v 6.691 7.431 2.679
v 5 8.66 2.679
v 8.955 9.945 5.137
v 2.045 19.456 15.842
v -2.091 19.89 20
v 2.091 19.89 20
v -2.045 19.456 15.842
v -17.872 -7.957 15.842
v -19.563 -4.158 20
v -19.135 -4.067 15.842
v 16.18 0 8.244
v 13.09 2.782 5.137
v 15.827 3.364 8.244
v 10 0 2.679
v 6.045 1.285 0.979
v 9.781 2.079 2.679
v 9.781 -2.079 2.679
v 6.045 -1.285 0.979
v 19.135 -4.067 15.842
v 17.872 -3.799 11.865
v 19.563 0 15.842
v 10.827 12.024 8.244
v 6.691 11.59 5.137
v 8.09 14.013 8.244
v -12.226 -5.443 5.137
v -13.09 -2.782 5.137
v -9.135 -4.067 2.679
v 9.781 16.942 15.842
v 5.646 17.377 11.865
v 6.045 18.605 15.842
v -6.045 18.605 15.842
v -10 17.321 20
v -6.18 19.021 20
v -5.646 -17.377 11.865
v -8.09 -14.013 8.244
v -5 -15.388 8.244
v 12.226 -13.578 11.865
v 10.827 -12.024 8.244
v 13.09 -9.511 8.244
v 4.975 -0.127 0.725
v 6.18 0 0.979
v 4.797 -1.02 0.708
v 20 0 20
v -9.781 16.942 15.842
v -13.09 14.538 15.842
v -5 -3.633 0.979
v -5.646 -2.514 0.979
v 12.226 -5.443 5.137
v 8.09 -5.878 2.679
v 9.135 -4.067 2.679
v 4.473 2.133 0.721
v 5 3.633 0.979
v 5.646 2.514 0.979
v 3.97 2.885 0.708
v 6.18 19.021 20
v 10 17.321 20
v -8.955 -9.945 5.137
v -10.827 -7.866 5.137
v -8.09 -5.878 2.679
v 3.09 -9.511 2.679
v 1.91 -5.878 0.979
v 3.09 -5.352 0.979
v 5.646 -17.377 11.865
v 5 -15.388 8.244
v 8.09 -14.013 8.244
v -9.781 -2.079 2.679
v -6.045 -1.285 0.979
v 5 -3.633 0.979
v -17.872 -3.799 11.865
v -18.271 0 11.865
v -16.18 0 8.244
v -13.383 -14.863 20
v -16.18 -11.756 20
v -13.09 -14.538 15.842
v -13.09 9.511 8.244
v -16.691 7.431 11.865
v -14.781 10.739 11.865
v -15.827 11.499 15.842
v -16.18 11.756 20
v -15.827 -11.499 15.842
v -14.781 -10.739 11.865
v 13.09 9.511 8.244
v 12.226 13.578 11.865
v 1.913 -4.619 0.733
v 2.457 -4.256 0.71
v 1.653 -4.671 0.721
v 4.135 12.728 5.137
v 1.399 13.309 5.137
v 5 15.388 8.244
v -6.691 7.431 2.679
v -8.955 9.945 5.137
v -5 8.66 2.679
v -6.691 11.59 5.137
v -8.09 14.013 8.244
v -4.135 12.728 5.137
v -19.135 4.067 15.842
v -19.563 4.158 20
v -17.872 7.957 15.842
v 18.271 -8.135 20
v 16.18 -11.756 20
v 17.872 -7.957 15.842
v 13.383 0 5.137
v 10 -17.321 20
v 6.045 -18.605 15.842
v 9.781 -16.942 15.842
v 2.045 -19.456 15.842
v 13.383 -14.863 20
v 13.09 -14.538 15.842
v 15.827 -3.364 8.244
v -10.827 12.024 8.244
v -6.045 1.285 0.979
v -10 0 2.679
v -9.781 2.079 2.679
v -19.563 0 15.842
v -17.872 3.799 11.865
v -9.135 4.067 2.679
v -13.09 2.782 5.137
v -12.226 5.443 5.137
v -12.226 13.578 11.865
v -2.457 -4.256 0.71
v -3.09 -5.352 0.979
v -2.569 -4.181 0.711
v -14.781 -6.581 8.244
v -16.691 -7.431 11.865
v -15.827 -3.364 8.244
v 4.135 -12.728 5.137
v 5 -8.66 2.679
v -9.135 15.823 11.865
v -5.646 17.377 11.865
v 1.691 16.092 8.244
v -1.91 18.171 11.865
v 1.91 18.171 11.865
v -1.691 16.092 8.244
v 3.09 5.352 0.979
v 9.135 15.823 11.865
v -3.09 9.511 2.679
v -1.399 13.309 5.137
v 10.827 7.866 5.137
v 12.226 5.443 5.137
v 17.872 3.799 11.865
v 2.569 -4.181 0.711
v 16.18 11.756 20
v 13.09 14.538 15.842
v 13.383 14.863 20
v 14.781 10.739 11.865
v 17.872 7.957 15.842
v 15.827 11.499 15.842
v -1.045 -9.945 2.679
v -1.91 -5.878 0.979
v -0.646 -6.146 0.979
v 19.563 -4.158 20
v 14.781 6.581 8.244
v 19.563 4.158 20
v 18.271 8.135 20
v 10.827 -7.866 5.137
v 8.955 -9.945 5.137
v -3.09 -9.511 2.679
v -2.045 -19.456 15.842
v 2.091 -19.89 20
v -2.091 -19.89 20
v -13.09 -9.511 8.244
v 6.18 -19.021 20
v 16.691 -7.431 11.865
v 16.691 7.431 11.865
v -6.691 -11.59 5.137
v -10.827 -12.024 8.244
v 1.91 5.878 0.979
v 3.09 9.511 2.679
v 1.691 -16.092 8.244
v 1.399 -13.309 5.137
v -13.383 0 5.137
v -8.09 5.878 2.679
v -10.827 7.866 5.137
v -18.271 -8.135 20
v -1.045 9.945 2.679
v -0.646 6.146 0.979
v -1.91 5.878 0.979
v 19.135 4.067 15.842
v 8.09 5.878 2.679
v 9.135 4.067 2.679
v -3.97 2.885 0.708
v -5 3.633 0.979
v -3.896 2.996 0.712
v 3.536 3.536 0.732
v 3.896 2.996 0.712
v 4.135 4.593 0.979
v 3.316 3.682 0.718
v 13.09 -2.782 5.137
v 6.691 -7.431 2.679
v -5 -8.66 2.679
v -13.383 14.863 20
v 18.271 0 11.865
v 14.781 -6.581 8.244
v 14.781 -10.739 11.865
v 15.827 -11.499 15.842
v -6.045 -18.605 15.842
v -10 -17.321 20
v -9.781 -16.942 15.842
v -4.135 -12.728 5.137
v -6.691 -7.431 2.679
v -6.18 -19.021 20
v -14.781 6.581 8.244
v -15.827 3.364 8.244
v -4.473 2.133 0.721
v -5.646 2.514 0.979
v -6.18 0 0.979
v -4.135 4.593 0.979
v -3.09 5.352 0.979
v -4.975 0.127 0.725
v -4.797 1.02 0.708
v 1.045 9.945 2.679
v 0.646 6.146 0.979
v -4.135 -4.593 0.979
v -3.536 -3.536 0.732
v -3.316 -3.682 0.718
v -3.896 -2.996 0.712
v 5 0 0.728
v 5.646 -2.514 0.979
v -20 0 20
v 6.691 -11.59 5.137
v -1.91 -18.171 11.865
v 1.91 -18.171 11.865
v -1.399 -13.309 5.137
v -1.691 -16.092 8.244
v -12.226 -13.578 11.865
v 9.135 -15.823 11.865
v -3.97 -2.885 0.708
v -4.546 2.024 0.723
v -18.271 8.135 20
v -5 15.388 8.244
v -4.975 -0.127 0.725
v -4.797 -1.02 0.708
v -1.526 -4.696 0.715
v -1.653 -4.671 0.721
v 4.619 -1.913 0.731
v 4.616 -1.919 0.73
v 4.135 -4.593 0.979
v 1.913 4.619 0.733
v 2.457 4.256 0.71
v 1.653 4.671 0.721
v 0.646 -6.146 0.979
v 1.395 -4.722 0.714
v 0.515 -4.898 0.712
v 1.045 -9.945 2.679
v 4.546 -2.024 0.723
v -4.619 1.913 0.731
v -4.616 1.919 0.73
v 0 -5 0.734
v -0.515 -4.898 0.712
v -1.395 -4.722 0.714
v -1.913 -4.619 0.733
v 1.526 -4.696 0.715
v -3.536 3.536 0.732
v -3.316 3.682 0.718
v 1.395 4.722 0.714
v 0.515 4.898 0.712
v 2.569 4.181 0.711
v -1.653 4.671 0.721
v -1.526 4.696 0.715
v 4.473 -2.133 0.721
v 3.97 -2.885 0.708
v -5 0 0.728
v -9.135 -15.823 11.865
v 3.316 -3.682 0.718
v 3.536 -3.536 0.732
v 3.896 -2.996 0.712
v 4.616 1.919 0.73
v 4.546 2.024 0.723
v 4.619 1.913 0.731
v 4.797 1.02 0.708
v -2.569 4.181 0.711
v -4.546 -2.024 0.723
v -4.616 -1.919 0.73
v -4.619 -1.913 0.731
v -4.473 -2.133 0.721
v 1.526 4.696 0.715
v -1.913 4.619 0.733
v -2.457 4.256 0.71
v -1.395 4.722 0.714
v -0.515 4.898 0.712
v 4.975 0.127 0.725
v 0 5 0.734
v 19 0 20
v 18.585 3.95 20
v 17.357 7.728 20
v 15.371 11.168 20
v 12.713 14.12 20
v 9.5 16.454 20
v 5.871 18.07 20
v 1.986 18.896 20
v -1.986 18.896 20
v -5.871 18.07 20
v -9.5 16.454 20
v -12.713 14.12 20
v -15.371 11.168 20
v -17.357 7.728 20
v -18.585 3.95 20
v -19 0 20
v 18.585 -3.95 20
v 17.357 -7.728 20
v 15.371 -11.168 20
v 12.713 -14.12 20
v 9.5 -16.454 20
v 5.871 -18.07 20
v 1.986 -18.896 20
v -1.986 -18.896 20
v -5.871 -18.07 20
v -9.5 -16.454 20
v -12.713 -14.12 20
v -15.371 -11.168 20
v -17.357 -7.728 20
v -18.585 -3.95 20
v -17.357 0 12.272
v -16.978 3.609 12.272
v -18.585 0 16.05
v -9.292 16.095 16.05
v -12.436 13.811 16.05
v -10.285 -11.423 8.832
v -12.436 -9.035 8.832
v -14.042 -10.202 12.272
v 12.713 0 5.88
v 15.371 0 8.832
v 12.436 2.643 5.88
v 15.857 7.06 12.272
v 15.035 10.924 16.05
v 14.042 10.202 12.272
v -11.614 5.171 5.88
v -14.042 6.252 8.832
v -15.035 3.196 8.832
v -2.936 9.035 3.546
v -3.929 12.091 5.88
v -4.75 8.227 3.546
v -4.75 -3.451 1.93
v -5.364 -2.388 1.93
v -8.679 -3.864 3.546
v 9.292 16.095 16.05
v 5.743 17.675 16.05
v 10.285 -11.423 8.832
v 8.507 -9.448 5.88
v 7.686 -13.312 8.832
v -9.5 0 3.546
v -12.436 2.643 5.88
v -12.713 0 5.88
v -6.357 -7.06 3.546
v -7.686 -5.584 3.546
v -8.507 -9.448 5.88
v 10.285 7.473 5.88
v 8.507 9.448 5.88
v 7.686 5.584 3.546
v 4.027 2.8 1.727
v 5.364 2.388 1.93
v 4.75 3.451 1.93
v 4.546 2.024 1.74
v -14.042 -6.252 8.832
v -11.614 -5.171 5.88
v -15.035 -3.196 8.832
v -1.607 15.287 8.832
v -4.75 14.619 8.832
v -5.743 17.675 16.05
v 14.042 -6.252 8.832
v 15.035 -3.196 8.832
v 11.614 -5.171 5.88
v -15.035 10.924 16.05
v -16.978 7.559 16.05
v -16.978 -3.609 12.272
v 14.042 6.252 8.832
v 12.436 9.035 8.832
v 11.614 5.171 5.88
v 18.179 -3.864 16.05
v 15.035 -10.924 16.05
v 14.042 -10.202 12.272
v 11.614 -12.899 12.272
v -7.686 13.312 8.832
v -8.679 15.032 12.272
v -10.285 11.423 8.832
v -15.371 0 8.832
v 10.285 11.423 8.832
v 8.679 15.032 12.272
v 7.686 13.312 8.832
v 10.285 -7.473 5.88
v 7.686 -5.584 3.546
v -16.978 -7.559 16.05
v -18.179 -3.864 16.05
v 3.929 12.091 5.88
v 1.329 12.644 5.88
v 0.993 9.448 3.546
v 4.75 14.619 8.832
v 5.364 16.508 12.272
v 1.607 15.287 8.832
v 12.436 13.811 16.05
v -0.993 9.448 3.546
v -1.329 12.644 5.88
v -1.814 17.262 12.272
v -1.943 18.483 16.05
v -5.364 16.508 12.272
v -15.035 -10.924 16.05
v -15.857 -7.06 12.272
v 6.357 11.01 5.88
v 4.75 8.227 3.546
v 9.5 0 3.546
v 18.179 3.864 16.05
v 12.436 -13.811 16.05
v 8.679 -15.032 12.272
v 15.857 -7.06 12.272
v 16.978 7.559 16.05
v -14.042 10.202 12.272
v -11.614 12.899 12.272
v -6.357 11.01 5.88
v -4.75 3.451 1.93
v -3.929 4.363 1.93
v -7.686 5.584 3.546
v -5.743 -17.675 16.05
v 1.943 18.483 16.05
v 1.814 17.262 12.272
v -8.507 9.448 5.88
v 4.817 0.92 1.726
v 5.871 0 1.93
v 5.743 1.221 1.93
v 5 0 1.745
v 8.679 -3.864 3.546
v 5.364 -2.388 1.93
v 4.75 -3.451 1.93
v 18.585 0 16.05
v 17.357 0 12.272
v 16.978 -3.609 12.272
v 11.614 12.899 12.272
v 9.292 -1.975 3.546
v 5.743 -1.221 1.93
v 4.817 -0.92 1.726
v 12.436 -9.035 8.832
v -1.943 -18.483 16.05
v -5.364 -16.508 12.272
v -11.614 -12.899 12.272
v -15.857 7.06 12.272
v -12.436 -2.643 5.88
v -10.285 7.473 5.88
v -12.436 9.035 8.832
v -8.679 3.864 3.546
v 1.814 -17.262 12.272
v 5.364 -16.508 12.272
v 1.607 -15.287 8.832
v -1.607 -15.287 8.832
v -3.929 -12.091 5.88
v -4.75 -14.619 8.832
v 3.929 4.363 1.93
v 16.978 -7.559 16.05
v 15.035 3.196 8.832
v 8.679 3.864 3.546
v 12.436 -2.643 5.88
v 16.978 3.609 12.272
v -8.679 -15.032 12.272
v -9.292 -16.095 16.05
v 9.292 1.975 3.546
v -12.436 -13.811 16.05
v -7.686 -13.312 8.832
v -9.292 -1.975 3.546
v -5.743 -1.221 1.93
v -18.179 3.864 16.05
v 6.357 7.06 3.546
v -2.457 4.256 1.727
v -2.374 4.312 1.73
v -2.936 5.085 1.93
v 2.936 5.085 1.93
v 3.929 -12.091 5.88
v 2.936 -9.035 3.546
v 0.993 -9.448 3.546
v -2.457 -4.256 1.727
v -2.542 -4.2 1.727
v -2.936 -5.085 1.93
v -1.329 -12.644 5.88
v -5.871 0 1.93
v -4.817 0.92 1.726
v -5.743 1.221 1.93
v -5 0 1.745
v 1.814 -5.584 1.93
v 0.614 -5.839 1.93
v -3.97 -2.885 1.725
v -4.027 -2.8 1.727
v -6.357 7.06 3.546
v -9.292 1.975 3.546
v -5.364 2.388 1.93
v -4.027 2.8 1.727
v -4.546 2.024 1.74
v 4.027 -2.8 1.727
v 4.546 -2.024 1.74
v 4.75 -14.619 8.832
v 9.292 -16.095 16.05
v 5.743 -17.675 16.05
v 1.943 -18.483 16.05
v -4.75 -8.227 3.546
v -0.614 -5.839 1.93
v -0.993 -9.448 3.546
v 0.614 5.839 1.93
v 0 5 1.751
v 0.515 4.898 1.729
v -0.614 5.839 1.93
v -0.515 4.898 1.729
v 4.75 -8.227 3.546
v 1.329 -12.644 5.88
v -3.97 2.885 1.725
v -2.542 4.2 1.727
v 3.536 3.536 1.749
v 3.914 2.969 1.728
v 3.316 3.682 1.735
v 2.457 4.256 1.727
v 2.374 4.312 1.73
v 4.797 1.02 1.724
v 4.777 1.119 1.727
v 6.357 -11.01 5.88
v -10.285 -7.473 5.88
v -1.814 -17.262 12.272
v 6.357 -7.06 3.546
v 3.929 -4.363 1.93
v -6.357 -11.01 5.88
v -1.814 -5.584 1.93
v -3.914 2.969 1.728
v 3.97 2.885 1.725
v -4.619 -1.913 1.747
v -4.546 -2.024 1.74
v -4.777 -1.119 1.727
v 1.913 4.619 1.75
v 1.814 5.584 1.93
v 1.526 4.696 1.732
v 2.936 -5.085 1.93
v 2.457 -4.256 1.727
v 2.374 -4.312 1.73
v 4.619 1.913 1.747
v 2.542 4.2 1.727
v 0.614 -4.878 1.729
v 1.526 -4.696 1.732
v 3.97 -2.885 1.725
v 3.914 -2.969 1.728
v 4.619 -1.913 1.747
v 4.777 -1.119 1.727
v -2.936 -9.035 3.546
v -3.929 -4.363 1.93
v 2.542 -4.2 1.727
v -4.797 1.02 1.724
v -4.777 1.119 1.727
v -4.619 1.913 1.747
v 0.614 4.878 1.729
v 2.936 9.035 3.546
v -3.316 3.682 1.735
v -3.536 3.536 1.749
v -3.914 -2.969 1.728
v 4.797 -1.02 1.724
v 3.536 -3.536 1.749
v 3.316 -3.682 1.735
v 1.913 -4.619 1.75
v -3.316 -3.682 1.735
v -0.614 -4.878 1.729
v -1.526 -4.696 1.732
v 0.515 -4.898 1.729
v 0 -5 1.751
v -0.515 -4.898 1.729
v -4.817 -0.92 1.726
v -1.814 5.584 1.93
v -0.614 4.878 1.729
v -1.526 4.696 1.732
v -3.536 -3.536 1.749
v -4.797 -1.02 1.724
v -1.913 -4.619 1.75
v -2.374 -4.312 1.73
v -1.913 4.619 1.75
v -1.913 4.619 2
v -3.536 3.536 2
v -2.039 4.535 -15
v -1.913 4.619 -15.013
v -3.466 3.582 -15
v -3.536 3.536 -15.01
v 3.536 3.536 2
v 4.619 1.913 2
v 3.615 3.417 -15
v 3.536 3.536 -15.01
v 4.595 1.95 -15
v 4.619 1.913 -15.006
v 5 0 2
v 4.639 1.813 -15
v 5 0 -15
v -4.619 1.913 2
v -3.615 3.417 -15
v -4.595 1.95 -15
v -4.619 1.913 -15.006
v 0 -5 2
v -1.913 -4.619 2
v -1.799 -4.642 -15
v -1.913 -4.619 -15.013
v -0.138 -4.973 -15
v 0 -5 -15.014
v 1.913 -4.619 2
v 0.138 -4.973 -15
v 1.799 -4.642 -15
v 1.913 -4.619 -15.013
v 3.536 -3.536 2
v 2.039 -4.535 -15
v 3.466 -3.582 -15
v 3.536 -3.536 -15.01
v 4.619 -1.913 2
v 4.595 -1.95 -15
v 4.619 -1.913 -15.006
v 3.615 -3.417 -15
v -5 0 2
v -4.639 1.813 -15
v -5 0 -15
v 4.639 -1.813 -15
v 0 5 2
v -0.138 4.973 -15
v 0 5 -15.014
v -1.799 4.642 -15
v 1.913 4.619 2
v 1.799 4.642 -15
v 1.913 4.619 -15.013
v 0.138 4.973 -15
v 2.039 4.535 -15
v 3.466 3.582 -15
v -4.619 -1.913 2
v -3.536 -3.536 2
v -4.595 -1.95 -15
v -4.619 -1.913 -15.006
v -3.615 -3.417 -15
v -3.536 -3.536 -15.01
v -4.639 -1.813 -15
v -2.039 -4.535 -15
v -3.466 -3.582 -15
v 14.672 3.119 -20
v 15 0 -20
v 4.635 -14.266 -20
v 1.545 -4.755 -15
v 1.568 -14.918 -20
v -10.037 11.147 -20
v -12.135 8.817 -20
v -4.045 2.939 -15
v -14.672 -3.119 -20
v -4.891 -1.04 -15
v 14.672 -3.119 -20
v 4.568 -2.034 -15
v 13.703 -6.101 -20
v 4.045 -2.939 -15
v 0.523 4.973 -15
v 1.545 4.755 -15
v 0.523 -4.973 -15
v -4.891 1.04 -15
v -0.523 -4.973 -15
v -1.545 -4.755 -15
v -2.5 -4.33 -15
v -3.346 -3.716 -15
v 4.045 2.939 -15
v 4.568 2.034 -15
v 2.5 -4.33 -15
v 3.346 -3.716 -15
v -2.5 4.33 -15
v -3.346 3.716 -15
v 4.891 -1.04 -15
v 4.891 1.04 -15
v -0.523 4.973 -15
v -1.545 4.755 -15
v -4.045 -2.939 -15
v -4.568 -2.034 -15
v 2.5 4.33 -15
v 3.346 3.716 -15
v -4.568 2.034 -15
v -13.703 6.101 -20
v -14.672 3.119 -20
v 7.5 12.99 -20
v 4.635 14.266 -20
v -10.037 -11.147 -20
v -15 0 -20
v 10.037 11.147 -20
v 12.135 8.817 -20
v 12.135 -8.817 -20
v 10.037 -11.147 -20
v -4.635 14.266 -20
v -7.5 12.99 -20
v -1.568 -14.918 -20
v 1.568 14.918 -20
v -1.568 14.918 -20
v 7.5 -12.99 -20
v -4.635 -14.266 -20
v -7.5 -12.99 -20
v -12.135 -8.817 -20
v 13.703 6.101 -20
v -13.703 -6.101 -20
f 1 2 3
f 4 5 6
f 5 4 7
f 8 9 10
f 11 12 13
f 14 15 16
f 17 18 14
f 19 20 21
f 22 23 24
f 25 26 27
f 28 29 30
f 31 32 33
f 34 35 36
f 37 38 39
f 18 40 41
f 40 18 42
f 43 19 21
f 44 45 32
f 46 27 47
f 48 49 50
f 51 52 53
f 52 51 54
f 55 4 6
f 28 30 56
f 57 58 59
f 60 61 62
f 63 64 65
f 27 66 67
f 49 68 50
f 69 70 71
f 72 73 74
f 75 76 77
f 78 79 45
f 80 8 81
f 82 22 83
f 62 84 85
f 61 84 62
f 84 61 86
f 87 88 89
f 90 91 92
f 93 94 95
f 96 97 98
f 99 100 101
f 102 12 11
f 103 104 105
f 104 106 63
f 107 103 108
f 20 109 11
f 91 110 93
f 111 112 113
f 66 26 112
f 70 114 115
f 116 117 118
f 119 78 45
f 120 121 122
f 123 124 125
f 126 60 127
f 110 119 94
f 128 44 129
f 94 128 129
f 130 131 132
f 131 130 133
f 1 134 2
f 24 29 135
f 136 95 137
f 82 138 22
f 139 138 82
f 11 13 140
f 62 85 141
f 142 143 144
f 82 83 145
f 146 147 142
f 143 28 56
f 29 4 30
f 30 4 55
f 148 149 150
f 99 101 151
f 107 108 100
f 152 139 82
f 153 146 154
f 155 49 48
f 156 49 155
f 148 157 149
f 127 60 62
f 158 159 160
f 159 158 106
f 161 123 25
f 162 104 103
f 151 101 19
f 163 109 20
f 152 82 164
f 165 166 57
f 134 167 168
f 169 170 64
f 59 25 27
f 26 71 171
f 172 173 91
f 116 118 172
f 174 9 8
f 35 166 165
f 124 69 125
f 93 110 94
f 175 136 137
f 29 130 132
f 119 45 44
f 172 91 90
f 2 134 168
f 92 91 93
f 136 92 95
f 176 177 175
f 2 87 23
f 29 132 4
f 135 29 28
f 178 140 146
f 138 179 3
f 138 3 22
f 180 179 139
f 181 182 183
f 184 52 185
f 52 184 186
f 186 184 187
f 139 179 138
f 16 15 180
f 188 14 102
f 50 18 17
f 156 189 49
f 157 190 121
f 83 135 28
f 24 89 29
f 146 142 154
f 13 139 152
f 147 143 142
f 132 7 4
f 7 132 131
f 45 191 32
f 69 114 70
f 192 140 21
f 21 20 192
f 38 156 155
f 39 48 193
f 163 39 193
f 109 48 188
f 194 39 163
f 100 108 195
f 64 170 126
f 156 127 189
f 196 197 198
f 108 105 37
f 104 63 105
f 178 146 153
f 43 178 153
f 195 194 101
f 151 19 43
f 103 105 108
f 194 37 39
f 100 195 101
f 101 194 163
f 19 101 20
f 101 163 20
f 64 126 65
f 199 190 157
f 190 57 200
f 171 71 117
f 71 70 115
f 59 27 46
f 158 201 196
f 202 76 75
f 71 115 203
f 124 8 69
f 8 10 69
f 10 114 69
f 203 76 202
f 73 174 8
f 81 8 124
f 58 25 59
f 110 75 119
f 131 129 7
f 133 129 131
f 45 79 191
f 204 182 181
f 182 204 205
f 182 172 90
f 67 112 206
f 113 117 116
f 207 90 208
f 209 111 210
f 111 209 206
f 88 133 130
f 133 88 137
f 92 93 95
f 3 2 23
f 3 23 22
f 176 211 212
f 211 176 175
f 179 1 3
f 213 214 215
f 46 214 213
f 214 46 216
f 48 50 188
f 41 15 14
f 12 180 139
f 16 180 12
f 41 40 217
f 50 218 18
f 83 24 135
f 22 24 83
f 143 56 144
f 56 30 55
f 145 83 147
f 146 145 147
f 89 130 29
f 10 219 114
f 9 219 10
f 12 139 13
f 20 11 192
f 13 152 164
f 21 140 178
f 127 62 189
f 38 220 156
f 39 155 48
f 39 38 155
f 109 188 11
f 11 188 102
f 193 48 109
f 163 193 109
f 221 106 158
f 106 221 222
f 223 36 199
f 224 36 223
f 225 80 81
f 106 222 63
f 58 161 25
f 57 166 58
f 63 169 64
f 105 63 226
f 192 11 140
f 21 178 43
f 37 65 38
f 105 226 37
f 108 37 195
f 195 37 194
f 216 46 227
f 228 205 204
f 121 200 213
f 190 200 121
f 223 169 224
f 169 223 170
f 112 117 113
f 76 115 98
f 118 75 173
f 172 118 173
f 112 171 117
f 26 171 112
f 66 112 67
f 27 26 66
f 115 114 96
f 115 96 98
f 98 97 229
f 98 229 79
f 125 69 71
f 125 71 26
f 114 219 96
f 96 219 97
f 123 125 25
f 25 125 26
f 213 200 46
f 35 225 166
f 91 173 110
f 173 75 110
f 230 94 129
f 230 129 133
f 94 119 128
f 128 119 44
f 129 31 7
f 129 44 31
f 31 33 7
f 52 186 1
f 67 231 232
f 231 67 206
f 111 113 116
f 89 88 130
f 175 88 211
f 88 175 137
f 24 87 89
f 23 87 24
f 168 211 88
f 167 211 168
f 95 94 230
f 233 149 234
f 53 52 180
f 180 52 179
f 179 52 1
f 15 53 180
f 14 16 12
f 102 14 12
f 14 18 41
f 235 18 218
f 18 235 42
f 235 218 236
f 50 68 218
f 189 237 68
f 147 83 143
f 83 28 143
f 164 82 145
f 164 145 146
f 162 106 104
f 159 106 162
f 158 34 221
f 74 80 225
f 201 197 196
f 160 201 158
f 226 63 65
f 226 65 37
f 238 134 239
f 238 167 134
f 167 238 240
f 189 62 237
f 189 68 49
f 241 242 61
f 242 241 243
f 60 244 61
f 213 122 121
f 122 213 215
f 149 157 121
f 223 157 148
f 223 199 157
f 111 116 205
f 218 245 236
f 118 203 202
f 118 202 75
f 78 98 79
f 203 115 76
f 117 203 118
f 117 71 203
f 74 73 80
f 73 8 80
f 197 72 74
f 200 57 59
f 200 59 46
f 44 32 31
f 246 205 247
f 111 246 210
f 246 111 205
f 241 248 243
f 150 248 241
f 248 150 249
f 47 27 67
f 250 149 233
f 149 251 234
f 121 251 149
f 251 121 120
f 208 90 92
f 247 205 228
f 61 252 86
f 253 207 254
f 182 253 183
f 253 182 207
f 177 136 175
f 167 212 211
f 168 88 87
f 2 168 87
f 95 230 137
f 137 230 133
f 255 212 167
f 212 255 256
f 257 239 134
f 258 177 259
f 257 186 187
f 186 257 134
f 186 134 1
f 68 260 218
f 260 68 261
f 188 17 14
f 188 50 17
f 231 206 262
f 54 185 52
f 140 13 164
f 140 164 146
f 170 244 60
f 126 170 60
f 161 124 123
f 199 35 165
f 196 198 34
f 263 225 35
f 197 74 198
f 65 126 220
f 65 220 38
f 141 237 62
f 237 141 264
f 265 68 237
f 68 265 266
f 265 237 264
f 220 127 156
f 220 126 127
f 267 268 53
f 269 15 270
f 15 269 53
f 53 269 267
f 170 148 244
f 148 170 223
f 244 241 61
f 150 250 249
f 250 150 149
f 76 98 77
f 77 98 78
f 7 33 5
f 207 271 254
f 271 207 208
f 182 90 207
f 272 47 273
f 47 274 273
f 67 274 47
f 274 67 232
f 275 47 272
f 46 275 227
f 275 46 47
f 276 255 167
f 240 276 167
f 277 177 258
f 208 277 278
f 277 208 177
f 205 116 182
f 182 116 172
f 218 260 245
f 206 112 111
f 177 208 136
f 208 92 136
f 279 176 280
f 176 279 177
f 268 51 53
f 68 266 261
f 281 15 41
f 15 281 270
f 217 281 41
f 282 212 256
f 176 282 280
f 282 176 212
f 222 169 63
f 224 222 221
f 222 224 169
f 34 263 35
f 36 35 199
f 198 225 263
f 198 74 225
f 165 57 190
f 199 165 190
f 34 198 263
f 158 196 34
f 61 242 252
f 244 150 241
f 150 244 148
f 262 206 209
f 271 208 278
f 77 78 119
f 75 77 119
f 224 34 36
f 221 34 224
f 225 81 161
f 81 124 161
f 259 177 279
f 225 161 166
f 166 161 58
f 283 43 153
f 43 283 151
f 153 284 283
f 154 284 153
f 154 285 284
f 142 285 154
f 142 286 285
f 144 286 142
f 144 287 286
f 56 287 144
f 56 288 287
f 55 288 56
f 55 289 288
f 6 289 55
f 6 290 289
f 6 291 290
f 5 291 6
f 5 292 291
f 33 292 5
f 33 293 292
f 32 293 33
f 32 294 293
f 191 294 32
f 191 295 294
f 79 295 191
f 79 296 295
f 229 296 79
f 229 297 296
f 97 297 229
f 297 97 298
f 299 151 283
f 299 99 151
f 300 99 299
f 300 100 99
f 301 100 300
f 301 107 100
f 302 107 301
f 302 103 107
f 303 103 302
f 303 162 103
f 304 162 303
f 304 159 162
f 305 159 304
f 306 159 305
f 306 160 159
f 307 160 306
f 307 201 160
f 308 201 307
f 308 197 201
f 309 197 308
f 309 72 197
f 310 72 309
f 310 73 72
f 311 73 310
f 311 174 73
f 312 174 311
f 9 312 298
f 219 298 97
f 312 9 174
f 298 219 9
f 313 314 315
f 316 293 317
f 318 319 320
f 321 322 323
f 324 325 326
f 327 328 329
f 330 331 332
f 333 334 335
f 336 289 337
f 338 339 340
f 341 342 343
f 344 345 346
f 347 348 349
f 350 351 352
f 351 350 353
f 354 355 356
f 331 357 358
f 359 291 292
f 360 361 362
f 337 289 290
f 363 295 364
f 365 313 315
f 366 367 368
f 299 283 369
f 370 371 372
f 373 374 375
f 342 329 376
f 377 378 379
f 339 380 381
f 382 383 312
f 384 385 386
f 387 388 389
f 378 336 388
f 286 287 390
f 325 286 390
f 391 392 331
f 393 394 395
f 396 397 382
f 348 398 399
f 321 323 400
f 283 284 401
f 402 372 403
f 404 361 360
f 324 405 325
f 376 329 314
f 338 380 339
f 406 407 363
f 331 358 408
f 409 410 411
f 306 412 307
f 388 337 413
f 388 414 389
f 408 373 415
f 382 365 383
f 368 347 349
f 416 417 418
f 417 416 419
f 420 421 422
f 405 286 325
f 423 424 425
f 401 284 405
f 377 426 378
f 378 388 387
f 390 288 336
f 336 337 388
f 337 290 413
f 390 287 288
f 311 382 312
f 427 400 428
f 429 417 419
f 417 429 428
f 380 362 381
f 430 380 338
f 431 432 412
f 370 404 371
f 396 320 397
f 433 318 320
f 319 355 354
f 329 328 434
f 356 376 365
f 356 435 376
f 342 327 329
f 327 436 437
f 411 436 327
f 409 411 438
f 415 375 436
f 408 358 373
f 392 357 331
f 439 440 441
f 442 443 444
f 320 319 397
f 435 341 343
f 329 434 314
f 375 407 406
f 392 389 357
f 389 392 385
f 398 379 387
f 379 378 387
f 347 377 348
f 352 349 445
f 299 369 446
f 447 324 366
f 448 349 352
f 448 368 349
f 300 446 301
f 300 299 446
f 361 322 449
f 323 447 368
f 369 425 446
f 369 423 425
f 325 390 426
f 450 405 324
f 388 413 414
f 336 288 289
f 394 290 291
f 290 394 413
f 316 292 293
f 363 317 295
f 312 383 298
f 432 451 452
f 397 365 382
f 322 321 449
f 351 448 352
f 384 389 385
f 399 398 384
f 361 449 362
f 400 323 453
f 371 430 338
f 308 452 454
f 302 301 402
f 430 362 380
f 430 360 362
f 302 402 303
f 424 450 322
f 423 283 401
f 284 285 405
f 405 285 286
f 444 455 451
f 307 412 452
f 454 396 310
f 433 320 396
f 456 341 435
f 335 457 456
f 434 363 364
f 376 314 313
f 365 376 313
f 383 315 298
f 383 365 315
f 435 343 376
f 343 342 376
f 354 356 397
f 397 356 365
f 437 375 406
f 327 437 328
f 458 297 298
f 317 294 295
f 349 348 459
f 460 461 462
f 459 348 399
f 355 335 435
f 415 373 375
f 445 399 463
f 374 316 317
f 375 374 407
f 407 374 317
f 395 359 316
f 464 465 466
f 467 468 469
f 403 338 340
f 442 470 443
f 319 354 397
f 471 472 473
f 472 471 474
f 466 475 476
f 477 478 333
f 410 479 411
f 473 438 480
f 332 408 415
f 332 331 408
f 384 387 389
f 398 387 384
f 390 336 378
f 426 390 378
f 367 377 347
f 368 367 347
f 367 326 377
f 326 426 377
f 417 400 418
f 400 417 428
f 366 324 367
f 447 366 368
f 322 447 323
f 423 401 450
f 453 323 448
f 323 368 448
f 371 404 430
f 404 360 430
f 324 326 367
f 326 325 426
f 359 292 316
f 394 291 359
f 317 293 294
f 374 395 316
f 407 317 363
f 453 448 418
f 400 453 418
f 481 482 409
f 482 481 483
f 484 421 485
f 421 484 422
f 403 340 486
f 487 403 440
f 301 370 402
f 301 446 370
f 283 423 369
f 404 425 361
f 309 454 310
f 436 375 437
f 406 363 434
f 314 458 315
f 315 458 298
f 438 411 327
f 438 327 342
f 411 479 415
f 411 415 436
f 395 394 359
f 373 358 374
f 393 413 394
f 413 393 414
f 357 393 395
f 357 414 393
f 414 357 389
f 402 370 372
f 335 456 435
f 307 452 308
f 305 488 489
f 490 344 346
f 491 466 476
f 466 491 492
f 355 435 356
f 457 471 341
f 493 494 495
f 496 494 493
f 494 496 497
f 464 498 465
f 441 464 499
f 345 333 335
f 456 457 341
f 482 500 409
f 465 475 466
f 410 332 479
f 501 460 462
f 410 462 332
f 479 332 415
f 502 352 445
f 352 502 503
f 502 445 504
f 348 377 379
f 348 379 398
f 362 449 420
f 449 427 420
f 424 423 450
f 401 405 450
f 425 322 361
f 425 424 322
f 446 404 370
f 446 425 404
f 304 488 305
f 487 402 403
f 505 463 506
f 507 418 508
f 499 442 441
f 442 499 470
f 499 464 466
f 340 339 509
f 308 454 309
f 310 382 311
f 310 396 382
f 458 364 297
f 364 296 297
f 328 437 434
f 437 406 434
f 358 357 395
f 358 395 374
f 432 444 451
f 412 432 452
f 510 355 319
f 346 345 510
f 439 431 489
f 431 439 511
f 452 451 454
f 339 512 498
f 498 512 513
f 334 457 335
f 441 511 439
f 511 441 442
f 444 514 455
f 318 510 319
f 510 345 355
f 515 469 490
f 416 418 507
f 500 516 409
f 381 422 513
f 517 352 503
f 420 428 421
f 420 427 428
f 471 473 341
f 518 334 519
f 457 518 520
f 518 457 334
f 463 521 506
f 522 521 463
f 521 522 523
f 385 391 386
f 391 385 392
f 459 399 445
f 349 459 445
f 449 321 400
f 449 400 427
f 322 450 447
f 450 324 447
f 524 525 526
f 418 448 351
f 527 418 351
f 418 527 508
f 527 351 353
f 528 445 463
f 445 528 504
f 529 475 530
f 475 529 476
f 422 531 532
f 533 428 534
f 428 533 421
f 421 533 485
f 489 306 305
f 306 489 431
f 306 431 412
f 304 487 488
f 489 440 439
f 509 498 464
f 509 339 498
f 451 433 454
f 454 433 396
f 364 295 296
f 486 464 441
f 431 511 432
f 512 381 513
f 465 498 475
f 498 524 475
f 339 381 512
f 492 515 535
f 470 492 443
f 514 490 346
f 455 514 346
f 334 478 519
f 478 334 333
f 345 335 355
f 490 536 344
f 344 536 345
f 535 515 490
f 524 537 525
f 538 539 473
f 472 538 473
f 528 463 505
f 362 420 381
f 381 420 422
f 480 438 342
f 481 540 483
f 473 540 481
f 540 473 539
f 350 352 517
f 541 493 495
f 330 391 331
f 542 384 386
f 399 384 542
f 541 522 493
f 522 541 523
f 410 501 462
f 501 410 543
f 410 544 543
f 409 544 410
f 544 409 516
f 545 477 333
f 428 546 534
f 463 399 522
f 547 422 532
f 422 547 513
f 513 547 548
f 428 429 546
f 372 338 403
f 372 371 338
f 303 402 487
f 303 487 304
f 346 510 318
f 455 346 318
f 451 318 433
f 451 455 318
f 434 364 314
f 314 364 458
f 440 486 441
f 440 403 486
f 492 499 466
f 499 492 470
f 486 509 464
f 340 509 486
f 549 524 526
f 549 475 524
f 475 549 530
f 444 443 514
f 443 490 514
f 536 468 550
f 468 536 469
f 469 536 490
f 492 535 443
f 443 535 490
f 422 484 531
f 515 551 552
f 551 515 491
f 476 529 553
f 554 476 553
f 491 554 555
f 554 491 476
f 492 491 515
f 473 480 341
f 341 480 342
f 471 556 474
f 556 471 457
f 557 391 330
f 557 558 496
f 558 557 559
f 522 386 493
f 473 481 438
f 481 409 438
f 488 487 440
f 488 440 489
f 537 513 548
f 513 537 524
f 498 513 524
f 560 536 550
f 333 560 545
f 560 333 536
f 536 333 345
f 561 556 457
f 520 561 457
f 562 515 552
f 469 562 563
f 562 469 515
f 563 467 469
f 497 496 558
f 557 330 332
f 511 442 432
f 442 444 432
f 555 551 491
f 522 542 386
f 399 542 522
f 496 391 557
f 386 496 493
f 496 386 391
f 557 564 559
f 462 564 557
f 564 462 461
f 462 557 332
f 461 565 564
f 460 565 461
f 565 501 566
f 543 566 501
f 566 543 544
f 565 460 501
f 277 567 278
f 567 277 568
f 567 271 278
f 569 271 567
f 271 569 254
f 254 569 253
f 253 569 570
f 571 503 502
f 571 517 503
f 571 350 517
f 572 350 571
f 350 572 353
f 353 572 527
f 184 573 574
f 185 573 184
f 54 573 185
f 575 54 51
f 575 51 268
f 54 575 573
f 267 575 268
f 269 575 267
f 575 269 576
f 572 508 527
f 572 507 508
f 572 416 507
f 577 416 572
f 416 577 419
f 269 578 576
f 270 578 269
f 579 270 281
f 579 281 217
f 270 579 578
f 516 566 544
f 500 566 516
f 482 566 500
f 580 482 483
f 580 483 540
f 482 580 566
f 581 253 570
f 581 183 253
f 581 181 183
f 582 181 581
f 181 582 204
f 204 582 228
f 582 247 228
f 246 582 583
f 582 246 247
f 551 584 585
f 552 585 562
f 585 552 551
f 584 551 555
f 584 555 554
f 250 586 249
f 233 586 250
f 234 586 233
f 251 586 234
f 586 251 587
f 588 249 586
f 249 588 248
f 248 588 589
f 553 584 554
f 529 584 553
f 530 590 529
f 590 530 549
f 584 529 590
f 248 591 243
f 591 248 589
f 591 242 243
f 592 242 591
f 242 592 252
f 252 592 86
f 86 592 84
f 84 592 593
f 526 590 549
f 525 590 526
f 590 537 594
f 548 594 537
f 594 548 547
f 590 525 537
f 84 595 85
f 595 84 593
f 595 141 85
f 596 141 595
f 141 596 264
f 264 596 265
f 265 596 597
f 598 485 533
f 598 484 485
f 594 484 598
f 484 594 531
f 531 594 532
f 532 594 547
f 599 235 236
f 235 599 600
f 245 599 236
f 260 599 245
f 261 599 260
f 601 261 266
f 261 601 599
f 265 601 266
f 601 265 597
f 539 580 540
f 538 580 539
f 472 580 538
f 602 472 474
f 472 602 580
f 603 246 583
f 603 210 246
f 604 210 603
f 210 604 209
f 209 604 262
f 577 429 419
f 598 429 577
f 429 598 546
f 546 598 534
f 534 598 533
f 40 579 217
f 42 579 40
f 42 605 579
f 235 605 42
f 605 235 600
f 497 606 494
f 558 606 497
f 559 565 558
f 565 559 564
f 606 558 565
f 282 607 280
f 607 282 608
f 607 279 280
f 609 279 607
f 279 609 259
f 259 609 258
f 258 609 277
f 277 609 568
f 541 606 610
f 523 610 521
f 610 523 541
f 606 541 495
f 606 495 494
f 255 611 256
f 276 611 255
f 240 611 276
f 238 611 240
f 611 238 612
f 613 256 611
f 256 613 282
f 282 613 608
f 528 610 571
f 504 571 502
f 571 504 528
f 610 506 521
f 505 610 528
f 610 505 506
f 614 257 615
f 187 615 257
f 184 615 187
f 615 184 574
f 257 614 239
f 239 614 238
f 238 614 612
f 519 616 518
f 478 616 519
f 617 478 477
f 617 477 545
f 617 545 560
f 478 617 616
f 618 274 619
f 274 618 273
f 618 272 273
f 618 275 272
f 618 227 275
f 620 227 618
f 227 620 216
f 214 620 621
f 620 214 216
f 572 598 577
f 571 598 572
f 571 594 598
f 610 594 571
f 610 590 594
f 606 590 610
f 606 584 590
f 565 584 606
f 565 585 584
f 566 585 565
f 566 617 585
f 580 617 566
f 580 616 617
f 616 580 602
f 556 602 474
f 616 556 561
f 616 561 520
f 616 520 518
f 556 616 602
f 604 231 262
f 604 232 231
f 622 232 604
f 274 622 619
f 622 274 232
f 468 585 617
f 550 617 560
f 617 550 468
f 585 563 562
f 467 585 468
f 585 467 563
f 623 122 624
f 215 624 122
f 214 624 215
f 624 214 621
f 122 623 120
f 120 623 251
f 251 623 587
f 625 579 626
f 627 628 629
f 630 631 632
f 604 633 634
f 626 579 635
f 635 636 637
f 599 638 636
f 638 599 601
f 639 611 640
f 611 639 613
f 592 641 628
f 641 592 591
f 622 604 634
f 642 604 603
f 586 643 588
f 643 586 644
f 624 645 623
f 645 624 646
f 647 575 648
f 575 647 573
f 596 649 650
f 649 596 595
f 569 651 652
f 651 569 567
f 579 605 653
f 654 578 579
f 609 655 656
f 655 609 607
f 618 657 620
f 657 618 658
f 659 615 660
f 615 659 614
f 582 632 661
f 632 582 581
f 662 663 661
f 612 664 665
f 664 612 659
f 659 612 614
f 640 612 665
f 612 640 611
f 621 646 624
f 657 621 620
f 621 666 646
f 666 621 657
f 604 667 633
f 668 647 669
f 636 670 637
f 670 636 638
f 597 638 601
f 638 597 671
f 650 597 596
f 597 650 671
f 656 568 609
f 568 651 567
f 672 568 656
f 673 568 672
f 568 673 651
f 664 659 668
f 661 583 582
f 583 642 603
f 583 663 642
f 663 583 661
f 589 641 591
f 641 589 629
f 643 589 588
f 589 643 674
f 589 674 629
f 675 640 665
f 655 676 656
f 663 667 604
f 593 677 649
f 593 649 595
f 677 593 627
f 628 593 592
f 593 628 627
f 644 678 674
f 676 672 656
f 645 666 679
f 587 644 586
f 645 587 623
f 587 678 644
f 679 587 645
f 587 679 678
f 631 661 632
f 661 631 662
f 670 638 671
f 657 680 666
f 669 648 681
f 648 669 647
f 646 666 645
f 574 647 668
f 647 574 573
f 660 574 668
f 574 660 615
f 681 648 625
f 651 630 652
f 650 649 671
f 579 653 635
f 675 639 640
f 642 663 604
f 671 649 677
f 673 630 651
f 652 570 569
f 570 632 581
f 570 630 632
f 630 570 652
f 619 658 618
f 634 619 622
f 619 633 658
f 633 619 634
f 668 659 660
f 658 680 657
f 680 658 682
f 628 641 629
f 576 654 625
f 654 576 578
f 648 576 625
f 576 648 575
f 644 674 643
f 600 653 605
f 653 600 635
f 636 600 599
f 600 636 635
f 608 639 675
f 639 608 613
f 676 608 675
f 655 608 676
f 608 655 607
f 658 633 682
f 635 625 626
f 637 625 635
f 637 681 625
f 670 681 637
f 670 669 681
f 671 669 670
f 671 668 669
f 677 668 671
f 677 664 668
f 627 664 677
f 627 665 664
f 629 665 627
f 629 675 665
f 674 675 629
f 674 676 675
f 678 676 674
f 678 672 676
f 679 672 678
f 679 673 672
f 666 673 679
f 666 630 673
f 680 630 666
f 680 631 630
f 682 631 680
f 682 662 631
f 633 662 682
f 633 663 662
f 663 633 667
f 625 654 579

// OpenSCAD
difference() {
	union() {
		translate(v = [0, 0, 20]) {
			difference() {
				sphere(r = 20);
				translate(v = [0, 0, 10]) {
					cube(center = true, size = [40, 50, 20]);
				}
				sphere(r = 19);
			}
		}
		translate(v = [0, 0, -8]) {
			cylinder(center = true, h = 20, r = 5);
		}
		translate(v = [0, 0, -20]) {
			cylinder(h = 5, r1 = 15, r2 = 5);
		}
	}
	mirror(v = [0, 1, 0]) {
		translate(v = [-8, -3, -20]) {
			text(size = 5, text = "Lukas");
		}
	}
}
